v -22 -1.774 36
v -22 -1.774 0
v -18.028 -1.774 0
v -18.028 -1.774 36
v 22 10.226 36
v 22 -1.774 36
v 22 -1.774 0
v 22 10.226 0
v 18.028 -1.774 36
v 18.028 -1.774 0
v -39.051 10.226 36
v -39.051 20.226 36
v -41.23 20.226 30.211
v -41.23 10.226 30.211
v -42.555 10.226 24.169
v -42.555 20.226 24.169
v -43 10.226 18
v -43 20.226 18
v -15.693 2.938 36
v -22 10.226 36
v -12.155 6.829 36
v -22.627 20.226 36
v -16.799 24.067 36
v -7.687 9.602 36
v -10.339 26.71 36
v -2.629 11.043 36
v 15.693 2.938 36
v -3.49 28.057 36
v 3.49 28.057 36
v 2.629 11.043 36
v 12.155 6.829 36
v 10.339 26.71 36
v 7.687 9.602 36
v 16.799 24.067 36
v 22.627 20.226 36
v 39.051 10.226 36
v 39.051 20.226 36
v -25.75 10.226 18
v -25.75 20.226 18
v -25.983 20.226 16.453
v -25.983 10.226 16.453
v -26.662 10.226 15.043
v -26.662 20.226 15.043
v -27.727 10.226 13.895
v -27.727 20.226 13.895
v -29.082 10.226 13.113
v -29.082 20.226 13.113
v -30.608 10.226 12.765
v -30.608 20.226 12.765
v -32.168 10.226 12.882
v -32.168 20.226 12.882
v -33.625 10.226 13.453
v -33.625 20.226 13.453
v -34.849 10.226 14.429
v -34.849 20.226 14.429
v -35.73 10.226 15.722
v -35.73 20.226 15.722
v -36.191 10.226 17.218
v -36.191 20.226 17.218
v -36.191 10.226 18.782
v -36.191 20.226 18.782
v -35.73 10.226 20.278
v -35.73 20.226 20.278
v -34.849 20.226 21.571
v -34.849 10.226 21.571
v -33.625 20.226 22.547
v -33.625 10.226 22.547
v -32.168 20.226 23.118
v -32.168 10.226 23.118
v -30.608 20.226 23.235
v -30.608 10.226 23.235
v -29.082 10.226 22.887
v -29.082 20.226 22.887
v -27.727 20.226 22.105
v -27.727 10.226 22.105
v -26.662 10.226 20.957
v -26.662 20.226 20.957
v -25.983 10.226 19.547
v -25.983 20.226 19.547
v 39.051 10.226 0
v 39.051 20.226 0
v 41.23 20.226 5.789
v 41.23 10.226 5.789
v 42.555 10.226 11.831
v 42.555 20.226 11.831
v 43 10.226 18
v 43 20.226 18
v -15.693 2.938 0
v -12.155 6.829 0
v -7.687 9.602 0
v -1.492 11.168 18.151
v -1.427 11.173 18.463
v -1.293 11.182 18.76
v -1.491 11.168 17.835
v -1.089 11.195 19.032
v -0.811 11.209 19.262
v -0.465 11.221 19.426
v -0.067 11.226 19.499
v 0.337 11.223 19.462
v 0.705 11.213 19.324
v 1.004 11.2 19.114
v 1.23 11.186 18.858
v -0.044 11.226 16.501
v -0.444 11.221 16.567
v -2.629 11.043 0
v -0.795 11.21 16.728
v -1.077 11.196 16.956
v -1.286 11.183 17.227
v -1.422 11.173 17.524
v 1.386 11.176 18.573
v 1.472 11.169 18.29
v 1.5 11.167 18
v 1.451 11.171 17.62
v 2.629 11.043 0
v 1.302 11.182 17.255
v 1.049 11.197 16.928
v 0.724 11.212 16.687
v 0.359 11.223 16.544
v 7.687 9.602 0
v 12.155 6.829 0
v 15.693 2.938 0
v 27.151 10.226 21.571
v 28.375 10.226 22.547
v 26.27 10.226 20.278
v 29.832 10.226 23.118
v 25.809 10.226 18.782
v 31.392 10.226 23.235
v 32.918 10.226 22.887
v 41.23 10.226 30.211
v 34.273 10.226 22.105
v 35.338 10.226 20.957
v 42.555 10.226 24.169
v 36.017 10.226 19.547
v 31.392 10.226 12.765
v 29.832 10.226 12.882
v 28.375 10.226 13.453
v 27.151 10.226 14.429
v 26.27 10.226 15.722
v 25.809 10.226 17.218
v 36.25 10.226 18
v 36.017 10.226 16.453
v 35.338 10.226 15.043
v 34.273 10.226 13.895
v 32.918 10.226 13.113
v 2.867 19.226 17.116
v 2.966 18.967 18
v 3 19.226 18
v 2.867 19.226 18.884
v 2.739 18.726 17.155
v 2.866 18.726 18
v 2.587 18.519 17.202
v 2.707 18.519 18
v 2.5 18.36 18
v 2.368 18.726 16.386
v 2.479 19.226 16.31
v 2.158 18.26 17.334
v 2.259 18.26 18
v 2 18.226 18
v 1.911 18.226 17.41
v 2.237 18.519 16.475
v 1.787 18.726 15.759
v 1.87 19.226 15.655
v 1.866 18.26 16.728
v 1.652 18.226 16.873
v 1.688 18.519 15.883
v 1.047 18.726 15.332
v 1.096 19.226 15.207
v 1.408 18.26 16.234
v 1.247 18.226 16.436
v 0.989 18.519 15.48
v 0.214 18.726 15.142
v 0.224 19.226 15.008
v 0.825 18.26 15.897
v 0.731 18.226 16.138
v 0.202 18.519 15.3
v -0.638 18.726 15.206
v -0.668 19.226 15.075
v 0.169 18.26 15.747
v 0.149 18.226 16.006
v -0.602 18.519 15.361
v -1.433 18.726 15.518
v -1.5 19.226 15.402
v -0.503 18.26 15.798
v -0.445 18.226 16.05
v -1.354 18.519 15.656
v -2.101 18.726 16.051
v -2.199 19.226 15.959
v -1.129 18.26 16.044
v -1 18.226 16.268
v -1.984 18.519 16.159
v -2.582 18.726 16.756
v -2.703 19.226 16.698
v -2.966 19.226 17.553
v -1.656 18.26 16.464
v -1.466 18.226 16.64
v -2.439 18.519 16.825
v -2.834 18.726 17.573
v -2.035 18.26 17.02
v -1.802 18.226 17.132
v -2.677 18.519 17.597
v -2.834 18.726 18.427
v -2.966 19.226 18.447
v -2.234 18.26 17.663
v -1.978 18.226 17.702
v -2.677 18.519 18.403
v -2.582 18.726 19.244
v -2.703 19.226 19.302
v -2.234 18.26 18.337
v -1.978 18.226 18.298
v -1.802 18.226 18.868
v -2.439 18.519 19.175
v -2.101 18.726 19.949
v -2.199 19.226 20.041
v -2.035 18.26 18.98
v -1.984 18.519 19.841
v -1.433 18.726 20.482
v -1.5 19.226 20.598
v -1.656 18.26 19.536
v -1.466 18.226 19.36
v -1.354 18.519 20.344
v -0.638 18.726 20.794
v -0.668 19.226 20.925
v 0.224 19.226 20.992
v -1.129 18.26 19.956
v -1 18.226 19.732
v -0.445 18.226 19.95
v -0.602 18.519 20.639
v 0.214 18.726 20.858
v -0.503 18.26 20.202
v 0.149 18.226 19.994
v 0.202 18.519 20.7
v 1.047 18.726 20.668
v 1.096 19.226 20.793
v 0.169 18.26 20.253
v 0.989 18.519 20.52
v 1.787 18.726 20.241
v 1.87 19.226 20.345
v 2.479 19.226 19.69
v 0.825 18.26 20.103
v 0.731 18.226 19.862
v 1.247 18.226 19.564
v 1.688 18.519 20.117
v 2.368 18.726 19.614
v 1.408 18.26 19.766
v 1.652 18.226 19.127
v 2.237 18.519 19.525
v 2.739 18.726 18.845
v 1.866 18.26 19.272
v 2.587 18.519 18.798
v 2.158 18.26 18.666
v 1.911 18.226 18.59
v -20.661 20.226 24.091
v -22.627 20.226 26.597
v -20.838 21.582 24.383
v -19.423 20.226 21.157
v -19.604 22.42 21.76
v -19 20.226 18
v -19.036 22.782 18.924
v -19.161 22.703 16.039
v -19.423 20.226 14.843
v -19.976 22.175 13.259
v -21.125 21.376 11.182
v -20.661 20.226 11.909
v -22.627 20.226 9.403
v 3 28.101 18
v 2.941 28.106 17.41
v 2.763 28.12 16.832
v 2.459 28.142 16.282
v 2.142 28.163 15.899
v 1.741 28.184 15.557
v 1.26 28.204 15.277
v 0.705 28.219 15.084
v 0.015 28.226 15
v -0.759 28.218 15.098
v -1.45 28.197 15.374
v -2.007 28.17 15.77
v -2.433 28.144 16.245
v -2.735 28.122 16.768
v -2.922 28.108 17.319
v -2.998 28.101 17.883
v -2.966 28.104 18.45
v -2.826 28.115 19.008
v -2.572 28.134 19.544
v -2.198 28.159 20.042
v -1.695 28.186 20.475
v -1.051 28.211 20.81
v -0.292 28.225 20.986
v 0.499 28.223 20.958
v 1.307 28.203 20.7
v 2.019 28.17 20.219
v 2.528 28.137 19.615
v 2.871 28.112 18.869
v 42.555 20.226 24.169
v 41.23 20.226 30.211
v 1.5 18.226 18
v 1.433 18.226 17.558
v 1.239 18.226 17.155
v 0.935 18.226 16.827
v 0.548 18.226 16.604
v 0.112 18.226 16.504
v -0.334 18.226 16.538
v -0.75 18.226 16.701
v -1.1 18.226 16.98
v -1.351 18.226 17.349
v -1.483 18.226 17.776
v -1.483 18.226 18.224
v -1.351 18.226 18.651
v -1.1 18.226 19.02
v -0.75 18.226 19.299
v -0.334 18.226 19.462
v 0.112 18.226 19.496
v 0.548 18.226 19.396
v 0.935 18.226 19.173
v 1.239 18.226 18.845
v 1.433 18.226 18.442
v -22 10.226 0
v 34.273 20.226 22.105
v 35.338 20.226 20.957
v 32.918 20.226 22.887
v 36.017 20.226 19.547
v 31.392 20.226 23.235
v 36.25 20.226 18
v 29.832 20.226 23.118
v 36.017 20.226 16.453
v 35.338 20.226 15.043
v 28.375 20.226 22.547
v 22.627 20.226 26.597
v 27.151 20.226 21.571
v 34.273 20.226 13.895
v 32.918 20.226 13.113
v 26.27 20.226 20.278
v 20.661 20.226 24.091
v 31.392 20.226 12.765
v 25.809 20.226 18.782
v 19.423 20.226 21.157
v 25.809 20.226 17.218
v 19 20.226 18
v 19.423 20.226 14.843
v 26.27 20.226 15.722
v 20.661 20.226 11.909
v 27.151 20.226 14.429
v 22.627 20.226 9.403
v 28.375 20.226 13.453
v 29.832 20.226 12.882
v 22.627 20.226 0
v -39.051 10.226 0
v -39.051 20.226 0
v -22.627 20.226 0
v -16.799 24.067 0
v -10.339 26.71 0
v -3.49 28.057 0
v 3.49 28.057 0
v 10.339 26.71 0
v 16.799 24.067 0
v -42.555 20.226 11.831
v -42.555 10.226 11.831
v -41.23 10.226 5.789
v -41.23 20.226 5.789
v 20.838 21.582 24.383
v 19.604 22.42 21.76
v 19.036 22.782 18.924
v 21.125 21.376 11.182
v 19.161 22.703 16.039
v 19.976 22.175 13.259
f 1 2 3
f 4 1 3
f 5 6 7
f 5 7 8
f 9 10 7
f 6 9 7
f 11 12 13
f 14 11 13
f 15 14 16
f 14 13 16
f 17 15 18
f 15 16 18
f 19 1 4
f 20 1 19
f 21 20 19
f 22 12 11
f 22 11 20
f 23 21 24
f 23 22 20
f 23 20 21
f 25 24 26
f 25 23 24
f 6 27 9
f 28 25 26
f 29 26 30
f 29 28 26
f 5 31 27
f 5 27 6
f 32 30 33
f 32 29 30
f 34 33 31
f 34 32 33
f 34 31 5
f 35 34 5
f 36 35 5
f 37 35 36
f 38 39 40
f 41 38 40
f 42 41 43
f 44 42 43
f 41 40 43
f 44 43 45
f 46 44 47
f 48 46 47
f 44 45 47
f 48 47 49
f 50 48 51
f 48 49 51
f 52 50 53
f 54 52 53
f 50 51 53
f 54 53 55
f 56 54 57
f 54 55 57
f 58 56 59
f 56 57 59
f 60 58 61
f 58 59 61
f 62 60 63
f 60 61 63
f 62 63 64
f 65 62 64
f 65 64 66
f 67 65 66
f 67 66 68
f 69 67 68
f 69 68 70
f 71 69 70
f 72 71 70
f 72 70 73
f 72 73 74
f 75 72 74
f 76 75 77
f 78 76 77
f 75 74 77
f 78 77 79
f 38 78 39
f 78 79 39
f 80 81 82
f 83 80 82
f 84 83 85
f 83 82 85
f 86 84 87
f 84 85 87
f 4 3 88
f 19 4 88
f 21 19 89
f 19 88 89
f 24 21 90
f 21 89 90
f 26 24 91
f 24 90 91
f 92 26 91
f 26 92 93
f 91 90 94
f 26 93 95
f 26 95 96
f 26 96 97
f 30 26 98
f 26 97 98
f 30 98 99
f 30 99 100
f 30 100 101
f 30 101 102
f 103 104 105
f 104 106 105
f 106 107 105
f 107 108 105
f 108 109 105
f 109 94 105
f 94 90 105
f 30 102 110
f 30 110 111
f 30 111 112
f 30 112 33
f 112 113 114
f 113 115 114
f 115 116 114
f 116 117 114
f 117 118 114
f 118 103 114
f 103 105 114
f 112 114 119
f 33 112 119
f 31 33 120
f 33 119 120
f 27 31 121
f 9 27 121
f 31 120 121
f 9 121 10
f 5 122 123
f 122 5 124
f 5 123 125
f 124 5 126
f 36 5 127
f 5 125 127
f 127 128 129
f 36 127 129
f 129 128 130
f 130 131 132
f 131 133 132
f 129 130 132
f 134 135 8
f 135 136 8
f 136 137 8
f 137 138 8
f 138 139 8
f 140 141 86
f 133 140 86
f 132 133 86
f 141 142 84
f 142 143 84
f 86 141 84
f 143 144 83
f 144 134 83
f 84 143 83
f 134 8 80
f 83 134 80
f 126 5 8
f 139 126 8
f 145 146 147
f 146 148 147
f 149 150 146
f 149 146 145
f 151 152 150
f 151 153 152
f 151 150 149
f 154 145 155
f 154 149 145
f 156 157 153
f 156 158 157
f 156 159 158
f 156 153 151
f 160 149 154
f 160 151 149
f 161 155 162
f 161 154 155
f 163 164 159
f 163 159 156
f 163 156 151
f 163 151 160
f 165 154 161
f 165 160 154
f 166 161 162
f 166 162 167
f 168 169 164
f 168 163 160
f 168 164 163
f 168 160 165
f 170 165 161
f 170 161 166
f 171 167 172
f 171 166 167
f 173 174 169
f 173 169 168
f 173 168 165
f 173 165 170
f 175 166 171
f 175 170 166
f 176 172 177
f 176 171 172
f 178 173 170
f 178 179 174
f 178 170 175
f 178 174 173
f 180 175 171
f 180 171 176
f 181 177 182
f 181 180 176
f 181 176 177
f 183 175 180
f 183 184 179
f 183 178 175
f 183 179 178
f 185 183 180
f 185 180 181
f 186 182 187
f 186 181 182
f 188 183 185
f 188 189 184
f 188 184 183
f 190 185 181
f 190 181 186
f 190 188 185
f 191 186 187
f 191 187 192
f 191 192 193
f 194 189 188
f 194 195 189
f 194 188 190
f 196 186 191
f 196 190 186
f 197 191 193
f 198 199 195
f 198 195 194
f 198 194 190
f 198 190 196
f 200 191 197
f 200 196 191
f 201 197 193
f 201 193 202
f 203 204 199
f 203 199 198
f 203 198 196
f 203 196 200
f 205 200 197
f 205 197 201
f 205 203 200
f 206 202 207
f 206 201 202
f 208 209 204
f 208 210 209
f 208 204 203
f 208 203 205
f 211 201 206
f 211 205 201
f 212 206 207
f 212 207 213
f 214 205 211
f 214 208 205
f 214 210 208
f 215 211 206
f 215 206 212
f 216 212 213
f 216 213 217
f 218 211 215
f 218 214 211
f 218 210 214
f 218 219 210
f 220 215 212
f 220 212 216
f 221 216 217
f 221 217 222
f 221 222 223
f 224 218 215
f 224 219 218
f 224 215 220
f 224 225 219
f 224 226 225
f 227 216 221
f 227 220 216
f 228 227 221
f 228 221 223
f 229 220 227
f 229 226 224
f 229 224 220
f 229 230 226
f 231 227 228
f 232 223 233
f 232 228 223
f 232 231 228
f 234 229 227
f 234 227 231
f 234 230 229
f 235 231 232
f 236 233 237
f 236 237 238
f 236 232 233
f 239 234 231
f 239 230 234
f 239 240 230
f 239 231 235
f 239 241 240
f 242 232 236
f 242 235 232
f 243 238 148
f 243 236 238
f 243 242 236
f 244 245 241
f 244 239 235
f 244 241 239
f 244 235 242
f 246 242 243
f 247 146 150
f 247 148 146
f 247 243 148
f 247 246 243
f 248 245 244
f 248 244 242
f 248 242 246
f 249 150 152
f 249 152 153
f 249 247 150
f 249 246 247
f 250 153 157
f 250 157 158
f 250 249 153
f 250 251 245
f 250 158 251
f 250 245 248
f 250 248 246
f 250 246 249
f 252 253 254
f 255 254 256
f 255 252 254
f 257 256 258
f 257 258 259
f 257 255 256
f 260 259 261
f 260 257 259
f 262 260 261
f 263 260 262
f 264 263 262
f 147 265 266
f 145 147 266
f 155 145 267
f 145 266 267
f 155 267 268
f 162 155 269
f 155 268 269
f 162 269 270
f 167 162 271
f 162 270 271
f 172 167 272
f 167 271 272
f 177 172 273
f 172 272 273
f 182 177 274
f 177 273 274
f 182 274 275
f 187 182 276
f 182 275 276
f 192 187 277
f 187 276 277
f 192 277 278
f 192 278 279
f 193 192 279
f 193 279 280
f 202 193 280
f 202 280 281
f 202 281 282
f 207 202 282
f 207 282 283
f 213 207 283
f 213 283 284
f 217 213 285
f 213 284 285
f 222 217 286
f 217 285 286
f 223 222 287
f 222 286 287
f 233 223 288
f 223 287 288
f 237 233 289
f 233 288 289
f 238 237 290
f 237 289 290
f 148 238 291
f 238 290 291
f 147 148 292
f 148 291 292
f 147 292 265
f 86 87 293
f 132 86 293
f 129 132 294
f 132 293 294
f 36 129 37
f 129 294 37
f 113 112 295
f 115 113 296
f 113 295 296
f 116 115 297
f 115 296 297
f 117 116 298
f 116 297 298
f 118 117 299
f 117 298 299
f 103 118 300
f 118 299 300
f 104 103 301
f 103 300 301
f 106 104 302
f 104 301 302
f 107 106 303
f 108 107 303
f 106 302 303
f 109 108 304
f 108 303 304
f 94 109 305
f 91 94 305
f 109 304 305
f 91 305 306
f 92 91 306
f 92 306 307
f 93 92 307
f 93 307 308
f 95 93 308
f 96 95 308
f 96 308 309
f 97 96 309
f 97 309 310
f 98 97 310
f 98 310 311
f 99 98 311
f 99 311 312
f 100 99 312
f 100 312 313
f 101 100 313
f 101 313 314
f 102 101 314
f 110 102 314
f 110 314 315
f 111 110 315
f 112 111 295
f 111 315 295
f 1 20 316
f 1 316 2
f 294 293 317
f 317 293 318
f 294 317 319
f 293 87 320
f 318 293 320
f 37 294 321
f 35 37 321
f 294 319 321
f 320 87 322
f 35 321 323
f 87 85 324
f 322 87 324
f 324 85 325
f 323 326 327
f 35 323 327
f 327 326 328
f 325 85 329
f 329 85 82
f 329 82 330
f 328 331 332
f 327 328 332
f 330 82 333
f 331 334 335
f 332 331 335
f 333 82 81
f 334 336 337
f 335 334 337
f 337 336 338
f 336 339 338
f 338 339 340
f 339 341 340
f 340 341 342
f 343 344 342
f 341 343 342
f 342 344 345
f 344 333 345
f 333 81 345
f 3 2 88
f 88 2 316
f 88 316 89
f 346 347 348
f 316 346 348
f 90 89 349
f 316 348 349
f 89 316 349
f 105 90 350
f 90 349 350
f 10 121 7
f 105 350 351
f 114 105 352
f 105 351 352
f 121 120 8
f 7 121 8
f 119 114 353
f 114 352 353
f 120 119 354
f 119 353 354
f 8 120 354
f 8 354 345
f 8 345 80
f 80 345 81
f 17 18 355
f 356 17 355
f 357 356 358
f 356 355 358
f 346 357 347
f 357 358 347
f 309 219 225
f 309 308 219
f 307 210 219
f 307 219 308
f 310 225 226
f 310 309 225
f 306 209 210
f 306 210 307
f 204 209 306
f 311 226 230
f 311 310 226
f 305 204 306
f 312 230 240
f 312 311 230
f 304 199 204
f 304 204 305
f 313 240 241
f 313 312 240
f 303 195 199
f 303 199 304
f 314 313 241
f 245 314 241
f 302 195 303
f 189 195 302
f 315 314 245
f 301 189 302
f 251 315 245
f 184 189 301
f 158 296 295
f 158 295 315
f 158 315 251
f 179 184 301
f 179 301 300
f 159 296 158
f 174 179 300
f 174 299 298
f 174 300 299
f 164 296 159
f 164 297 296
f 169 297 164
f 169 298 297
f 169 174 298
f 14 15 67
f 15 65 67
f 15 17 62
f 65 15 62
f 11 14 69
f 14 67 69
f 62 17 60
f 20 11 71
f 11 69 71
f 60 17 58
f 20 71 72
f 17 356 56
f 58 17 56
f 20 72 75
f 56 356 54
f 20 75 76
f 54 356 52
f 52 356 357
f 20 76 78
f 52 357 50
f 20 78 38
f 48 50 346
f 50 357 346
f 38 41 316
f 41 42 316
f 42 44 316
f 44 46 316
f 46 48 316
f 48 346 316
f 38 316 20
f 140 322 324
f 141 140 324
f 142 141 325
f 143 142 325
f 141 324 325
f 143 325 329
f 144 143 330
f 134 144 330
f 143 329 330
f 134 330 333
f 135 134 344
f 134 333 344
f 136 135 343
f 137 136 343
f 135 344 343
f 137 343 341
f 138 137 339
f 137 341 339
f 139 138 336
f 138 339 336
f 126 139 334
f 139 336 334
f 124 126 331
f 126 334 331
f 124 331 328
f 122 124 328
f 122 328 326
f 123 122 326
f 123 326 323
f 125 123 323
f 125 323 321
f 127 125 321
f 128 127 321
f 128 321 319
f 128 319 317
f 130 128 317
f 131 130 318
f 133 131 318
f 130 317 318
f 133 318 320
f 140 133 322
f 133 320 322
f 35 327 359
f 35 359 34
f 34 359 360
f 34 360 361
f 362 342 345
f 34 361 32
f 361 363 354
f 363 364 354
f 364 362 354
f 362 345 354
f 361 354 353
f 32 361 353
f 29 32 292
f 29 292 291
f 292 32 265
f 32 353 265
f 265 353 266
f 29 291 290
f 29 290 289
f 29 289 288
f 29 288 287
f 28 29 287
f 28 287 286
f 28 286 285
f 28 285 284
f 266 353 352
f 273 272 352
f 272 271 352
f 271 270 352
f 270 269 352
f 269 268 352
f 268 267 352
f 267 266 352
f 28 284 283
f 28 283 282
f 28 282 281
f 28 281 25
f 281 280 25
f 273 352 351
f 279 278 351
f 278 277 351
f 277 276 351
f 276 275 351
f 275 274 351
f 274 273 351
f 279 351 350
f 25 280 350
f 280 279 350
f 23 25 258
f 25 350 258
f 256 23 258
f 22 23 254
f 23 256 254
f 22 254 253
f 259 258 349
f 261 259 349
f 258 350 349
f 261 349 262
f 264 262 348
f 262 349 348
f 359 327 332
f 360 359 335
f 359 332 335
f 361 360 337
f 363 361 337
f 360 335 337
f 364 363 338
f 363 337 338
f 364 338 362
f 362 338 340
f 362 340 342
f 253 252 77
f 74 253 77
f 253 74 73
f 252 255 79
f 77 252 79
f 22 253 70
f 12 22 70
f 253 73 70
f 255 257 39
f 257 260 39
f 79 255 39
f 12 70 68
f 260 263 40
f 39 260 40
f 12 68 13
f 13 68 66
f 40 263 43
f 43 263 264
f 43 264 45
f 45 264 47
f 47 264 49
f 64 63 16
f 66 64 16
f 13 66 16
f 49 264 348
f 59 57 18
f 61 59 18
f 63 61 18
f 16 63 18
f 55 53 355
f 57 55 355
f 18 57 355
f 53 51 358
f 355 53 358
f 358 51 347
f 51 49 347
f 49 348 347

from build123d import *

# Parameters (mm, degrees)
BOSS_EXTRUDE1_DEPTH = 36
CUT_EXTRUDE1_DEPTH  = 10
CUT_EXTRUDE2_DEPTH  = 10
CUT_EXTRUDE8_DEPTH  = 10
SKETCH9_R           = 5.25
CUT_EXTRUDE9_DEPTH  = 10
CUT_EXTRUDE10_DEPTH = 10
SKETCH11_R          = 3
CUT_EXTRUDE11_DEPTH = 10
SKETCH13_R          = 1.5
CUT_EXTRUDE12_DEPTH = 10
FILLET2_R           = 1


with BuildPart() as part:
    # Sketch1 → Boss-Extrude1 (new body)
    with BuildSketch(Plane.XY):
        with BuildLine():
            Line((-22.627416998, 20.226289935), (-43, 20.226289935))
            Line((-43, 20.226289935), (-43, 10.226289935))
            Line((-43, 10.226289935), (-22, 10.226289935))
            Line((-22, 10.226289935), (-22, -1.773710065))
            Line((-22, -1.773710065), (-18.027756377, -1.773710065))
            ThreePointArc((-18.027756377, -1.773710065), (0, 11.226289935), (18.027756377, -1.773710065))
            Line((18.027756377, -1.773710065), (22, -1.773710065))
            Line((22, -1.773710065), (22, 10.226289935))
            Line((22, 10.226289935), (43, 10.226289935))
            Line((43, 10.226289935), (43, 20.226289935))
            Line((43, 20.226289935), (22.627416998, 20.226289935))
            ThreePointArc((22.627416998, 20.226289935), (0, 28.226289935), (-22.627416998, 20.226289935))
        make_face()
    extrude(amount=BOSS_EXTRUDE1_DEPTH)

    # Sketch3 → Cut-Extrude1 (cut)
    with BuildSketch(Plane(origin=(0, 20.226289935, 0), x_dir=(1, 0, 0), z_dir=(0, 1, 0))):
        with BuildLine():
            ThreePointArc((-43, -18), (-42.001212365, -8.785980256), (-39.05124838, 0))
            Line((-39.05124838, 0), (-43, 0))
            Line((-43, 0), (-43, -18))
        make_face()
    extrude(amount=-CUT_EXTRUDE1_DEPTH, mode=Mode.SUBTRACT)

    # Sketch4 → Cut-Extrude2 (cut)
    with BuildSketch(Plane(origin=(0, 20.226289935, 0), x_dir=(1, 0, 0), z_dir=(0, 1, 0))):
        with BuildLine():
            ThreePointArc((-39.05124838, -36), (-42.001212365, -27.214019744), (-43, -18))
            Line((-43, -18), (-43, -36))
            Line((-43, -36), (-39.05124838, -36))
        make_face()
    extrude(amount=-CUT_EXTRUDE2_DEPTH, mode=Mode.SUBTRACT)

    # Sketch5 → Cut-Extrude8 (cut)
    with BuildSketch(Plane(origin=(0, 20.226289935, 0), x_dir=(1, 0, 0), z_dir=(0, 1, 0))):
        with BuildLine():
            Line((43, -36), (43, -18))
            ThreePointArc((43, -18), (42.001212365, -27.214019744), (39.05124838, -36))
            Line((39.05124838, -36), (43, -36))
        make_face()
        with BuildLine():
            ThreePointArc((39.05124838, 0), (42.001212365, -8.785980256), (43, -18))
            Line((43, -18), (43, 0))
            Line((43, 0), (39.05124838, 0))
        make_face()
    extrude(amount=-CUT_EXTRUDE8_DEPTH, mode=Mode.SUBTRACT)

    # Sketch9 → Cut-Extrude9 (cut)
    with BuildSketch(Plane(origin=(0, 20.226289935, 0), x_dir=(1, 0, 0), z_dir=(0, 1, 0))):
        with Locations((31, -18)):
            Circle(SKETCH9_R)
        with Locations((-31, -18)):
            Circle(SKETCH9_R)
    extrude(amount=-CUT_EXTRUDE9_DEPTH, mode=Mode.SUBTRACT)

    # Sketch10 → Cut-Extrude10 (cut)
    with BuildSketch(Plane(origin=(0, 20.226289935, 0), x_dir=(1, 0, 0), z_dir=(0, 1, 0))):
        with BuildLine():
            Line((22.627416998, -9.403497579), (22.627416998, -26.596502421))
            ThreePointArc((22.627416998, -26.596502421), (19, -18), (22.627416998, -9.403497579))
        make_face()
        with BuildLine():
            Line((-22.627416998, -9.403497579), (-22.627416998, -26.596502421))
            ThreePointArc((-22.627416998, -26.596502421), (-19, -18), (-22.627416998, -9.403497579))
        make_face()
    extrude(amount=CUT_EXTRUDE10_DEPTH, mode=Mode.SUBTRACT)

    # Sketch11 → Cut-Extrude11 (cut)
    with BuildSketch(Plane(origin=(0, 28.226289935, 0), x_dir=(1, 0, 0), z_dir=(0, 1, 0))):
        with Locations((0, -18)):
            Circle(SKETCH11_R)
    extrude(amount=-CUT_EXTRUDE11_DEPTH, mode=Mode.SUBTRACT)

    # Sketch13 → Cut-Extrude12 (cut)
    with BuildSketch(Plane(origin=(0, 18.226289935, 0), x_dir=(1, 0, 0), z_dir=(0, 1, 0))):
        with Locations((0, -18)):
            Circle(SKETCH13_R)
    extrude(amount=-CUT_EXTRUDE12_DEPTH, mode=Mode.SUBTRACT)

    # Fillet2
    fillet2_edges = [part.edges().sort_by_distance(p)[0] for p in [
        (-3, 18.226289935, 18),
    ]]
    fillet(fillet2_edges, radius=FILLET2_R)


solid = part.part
